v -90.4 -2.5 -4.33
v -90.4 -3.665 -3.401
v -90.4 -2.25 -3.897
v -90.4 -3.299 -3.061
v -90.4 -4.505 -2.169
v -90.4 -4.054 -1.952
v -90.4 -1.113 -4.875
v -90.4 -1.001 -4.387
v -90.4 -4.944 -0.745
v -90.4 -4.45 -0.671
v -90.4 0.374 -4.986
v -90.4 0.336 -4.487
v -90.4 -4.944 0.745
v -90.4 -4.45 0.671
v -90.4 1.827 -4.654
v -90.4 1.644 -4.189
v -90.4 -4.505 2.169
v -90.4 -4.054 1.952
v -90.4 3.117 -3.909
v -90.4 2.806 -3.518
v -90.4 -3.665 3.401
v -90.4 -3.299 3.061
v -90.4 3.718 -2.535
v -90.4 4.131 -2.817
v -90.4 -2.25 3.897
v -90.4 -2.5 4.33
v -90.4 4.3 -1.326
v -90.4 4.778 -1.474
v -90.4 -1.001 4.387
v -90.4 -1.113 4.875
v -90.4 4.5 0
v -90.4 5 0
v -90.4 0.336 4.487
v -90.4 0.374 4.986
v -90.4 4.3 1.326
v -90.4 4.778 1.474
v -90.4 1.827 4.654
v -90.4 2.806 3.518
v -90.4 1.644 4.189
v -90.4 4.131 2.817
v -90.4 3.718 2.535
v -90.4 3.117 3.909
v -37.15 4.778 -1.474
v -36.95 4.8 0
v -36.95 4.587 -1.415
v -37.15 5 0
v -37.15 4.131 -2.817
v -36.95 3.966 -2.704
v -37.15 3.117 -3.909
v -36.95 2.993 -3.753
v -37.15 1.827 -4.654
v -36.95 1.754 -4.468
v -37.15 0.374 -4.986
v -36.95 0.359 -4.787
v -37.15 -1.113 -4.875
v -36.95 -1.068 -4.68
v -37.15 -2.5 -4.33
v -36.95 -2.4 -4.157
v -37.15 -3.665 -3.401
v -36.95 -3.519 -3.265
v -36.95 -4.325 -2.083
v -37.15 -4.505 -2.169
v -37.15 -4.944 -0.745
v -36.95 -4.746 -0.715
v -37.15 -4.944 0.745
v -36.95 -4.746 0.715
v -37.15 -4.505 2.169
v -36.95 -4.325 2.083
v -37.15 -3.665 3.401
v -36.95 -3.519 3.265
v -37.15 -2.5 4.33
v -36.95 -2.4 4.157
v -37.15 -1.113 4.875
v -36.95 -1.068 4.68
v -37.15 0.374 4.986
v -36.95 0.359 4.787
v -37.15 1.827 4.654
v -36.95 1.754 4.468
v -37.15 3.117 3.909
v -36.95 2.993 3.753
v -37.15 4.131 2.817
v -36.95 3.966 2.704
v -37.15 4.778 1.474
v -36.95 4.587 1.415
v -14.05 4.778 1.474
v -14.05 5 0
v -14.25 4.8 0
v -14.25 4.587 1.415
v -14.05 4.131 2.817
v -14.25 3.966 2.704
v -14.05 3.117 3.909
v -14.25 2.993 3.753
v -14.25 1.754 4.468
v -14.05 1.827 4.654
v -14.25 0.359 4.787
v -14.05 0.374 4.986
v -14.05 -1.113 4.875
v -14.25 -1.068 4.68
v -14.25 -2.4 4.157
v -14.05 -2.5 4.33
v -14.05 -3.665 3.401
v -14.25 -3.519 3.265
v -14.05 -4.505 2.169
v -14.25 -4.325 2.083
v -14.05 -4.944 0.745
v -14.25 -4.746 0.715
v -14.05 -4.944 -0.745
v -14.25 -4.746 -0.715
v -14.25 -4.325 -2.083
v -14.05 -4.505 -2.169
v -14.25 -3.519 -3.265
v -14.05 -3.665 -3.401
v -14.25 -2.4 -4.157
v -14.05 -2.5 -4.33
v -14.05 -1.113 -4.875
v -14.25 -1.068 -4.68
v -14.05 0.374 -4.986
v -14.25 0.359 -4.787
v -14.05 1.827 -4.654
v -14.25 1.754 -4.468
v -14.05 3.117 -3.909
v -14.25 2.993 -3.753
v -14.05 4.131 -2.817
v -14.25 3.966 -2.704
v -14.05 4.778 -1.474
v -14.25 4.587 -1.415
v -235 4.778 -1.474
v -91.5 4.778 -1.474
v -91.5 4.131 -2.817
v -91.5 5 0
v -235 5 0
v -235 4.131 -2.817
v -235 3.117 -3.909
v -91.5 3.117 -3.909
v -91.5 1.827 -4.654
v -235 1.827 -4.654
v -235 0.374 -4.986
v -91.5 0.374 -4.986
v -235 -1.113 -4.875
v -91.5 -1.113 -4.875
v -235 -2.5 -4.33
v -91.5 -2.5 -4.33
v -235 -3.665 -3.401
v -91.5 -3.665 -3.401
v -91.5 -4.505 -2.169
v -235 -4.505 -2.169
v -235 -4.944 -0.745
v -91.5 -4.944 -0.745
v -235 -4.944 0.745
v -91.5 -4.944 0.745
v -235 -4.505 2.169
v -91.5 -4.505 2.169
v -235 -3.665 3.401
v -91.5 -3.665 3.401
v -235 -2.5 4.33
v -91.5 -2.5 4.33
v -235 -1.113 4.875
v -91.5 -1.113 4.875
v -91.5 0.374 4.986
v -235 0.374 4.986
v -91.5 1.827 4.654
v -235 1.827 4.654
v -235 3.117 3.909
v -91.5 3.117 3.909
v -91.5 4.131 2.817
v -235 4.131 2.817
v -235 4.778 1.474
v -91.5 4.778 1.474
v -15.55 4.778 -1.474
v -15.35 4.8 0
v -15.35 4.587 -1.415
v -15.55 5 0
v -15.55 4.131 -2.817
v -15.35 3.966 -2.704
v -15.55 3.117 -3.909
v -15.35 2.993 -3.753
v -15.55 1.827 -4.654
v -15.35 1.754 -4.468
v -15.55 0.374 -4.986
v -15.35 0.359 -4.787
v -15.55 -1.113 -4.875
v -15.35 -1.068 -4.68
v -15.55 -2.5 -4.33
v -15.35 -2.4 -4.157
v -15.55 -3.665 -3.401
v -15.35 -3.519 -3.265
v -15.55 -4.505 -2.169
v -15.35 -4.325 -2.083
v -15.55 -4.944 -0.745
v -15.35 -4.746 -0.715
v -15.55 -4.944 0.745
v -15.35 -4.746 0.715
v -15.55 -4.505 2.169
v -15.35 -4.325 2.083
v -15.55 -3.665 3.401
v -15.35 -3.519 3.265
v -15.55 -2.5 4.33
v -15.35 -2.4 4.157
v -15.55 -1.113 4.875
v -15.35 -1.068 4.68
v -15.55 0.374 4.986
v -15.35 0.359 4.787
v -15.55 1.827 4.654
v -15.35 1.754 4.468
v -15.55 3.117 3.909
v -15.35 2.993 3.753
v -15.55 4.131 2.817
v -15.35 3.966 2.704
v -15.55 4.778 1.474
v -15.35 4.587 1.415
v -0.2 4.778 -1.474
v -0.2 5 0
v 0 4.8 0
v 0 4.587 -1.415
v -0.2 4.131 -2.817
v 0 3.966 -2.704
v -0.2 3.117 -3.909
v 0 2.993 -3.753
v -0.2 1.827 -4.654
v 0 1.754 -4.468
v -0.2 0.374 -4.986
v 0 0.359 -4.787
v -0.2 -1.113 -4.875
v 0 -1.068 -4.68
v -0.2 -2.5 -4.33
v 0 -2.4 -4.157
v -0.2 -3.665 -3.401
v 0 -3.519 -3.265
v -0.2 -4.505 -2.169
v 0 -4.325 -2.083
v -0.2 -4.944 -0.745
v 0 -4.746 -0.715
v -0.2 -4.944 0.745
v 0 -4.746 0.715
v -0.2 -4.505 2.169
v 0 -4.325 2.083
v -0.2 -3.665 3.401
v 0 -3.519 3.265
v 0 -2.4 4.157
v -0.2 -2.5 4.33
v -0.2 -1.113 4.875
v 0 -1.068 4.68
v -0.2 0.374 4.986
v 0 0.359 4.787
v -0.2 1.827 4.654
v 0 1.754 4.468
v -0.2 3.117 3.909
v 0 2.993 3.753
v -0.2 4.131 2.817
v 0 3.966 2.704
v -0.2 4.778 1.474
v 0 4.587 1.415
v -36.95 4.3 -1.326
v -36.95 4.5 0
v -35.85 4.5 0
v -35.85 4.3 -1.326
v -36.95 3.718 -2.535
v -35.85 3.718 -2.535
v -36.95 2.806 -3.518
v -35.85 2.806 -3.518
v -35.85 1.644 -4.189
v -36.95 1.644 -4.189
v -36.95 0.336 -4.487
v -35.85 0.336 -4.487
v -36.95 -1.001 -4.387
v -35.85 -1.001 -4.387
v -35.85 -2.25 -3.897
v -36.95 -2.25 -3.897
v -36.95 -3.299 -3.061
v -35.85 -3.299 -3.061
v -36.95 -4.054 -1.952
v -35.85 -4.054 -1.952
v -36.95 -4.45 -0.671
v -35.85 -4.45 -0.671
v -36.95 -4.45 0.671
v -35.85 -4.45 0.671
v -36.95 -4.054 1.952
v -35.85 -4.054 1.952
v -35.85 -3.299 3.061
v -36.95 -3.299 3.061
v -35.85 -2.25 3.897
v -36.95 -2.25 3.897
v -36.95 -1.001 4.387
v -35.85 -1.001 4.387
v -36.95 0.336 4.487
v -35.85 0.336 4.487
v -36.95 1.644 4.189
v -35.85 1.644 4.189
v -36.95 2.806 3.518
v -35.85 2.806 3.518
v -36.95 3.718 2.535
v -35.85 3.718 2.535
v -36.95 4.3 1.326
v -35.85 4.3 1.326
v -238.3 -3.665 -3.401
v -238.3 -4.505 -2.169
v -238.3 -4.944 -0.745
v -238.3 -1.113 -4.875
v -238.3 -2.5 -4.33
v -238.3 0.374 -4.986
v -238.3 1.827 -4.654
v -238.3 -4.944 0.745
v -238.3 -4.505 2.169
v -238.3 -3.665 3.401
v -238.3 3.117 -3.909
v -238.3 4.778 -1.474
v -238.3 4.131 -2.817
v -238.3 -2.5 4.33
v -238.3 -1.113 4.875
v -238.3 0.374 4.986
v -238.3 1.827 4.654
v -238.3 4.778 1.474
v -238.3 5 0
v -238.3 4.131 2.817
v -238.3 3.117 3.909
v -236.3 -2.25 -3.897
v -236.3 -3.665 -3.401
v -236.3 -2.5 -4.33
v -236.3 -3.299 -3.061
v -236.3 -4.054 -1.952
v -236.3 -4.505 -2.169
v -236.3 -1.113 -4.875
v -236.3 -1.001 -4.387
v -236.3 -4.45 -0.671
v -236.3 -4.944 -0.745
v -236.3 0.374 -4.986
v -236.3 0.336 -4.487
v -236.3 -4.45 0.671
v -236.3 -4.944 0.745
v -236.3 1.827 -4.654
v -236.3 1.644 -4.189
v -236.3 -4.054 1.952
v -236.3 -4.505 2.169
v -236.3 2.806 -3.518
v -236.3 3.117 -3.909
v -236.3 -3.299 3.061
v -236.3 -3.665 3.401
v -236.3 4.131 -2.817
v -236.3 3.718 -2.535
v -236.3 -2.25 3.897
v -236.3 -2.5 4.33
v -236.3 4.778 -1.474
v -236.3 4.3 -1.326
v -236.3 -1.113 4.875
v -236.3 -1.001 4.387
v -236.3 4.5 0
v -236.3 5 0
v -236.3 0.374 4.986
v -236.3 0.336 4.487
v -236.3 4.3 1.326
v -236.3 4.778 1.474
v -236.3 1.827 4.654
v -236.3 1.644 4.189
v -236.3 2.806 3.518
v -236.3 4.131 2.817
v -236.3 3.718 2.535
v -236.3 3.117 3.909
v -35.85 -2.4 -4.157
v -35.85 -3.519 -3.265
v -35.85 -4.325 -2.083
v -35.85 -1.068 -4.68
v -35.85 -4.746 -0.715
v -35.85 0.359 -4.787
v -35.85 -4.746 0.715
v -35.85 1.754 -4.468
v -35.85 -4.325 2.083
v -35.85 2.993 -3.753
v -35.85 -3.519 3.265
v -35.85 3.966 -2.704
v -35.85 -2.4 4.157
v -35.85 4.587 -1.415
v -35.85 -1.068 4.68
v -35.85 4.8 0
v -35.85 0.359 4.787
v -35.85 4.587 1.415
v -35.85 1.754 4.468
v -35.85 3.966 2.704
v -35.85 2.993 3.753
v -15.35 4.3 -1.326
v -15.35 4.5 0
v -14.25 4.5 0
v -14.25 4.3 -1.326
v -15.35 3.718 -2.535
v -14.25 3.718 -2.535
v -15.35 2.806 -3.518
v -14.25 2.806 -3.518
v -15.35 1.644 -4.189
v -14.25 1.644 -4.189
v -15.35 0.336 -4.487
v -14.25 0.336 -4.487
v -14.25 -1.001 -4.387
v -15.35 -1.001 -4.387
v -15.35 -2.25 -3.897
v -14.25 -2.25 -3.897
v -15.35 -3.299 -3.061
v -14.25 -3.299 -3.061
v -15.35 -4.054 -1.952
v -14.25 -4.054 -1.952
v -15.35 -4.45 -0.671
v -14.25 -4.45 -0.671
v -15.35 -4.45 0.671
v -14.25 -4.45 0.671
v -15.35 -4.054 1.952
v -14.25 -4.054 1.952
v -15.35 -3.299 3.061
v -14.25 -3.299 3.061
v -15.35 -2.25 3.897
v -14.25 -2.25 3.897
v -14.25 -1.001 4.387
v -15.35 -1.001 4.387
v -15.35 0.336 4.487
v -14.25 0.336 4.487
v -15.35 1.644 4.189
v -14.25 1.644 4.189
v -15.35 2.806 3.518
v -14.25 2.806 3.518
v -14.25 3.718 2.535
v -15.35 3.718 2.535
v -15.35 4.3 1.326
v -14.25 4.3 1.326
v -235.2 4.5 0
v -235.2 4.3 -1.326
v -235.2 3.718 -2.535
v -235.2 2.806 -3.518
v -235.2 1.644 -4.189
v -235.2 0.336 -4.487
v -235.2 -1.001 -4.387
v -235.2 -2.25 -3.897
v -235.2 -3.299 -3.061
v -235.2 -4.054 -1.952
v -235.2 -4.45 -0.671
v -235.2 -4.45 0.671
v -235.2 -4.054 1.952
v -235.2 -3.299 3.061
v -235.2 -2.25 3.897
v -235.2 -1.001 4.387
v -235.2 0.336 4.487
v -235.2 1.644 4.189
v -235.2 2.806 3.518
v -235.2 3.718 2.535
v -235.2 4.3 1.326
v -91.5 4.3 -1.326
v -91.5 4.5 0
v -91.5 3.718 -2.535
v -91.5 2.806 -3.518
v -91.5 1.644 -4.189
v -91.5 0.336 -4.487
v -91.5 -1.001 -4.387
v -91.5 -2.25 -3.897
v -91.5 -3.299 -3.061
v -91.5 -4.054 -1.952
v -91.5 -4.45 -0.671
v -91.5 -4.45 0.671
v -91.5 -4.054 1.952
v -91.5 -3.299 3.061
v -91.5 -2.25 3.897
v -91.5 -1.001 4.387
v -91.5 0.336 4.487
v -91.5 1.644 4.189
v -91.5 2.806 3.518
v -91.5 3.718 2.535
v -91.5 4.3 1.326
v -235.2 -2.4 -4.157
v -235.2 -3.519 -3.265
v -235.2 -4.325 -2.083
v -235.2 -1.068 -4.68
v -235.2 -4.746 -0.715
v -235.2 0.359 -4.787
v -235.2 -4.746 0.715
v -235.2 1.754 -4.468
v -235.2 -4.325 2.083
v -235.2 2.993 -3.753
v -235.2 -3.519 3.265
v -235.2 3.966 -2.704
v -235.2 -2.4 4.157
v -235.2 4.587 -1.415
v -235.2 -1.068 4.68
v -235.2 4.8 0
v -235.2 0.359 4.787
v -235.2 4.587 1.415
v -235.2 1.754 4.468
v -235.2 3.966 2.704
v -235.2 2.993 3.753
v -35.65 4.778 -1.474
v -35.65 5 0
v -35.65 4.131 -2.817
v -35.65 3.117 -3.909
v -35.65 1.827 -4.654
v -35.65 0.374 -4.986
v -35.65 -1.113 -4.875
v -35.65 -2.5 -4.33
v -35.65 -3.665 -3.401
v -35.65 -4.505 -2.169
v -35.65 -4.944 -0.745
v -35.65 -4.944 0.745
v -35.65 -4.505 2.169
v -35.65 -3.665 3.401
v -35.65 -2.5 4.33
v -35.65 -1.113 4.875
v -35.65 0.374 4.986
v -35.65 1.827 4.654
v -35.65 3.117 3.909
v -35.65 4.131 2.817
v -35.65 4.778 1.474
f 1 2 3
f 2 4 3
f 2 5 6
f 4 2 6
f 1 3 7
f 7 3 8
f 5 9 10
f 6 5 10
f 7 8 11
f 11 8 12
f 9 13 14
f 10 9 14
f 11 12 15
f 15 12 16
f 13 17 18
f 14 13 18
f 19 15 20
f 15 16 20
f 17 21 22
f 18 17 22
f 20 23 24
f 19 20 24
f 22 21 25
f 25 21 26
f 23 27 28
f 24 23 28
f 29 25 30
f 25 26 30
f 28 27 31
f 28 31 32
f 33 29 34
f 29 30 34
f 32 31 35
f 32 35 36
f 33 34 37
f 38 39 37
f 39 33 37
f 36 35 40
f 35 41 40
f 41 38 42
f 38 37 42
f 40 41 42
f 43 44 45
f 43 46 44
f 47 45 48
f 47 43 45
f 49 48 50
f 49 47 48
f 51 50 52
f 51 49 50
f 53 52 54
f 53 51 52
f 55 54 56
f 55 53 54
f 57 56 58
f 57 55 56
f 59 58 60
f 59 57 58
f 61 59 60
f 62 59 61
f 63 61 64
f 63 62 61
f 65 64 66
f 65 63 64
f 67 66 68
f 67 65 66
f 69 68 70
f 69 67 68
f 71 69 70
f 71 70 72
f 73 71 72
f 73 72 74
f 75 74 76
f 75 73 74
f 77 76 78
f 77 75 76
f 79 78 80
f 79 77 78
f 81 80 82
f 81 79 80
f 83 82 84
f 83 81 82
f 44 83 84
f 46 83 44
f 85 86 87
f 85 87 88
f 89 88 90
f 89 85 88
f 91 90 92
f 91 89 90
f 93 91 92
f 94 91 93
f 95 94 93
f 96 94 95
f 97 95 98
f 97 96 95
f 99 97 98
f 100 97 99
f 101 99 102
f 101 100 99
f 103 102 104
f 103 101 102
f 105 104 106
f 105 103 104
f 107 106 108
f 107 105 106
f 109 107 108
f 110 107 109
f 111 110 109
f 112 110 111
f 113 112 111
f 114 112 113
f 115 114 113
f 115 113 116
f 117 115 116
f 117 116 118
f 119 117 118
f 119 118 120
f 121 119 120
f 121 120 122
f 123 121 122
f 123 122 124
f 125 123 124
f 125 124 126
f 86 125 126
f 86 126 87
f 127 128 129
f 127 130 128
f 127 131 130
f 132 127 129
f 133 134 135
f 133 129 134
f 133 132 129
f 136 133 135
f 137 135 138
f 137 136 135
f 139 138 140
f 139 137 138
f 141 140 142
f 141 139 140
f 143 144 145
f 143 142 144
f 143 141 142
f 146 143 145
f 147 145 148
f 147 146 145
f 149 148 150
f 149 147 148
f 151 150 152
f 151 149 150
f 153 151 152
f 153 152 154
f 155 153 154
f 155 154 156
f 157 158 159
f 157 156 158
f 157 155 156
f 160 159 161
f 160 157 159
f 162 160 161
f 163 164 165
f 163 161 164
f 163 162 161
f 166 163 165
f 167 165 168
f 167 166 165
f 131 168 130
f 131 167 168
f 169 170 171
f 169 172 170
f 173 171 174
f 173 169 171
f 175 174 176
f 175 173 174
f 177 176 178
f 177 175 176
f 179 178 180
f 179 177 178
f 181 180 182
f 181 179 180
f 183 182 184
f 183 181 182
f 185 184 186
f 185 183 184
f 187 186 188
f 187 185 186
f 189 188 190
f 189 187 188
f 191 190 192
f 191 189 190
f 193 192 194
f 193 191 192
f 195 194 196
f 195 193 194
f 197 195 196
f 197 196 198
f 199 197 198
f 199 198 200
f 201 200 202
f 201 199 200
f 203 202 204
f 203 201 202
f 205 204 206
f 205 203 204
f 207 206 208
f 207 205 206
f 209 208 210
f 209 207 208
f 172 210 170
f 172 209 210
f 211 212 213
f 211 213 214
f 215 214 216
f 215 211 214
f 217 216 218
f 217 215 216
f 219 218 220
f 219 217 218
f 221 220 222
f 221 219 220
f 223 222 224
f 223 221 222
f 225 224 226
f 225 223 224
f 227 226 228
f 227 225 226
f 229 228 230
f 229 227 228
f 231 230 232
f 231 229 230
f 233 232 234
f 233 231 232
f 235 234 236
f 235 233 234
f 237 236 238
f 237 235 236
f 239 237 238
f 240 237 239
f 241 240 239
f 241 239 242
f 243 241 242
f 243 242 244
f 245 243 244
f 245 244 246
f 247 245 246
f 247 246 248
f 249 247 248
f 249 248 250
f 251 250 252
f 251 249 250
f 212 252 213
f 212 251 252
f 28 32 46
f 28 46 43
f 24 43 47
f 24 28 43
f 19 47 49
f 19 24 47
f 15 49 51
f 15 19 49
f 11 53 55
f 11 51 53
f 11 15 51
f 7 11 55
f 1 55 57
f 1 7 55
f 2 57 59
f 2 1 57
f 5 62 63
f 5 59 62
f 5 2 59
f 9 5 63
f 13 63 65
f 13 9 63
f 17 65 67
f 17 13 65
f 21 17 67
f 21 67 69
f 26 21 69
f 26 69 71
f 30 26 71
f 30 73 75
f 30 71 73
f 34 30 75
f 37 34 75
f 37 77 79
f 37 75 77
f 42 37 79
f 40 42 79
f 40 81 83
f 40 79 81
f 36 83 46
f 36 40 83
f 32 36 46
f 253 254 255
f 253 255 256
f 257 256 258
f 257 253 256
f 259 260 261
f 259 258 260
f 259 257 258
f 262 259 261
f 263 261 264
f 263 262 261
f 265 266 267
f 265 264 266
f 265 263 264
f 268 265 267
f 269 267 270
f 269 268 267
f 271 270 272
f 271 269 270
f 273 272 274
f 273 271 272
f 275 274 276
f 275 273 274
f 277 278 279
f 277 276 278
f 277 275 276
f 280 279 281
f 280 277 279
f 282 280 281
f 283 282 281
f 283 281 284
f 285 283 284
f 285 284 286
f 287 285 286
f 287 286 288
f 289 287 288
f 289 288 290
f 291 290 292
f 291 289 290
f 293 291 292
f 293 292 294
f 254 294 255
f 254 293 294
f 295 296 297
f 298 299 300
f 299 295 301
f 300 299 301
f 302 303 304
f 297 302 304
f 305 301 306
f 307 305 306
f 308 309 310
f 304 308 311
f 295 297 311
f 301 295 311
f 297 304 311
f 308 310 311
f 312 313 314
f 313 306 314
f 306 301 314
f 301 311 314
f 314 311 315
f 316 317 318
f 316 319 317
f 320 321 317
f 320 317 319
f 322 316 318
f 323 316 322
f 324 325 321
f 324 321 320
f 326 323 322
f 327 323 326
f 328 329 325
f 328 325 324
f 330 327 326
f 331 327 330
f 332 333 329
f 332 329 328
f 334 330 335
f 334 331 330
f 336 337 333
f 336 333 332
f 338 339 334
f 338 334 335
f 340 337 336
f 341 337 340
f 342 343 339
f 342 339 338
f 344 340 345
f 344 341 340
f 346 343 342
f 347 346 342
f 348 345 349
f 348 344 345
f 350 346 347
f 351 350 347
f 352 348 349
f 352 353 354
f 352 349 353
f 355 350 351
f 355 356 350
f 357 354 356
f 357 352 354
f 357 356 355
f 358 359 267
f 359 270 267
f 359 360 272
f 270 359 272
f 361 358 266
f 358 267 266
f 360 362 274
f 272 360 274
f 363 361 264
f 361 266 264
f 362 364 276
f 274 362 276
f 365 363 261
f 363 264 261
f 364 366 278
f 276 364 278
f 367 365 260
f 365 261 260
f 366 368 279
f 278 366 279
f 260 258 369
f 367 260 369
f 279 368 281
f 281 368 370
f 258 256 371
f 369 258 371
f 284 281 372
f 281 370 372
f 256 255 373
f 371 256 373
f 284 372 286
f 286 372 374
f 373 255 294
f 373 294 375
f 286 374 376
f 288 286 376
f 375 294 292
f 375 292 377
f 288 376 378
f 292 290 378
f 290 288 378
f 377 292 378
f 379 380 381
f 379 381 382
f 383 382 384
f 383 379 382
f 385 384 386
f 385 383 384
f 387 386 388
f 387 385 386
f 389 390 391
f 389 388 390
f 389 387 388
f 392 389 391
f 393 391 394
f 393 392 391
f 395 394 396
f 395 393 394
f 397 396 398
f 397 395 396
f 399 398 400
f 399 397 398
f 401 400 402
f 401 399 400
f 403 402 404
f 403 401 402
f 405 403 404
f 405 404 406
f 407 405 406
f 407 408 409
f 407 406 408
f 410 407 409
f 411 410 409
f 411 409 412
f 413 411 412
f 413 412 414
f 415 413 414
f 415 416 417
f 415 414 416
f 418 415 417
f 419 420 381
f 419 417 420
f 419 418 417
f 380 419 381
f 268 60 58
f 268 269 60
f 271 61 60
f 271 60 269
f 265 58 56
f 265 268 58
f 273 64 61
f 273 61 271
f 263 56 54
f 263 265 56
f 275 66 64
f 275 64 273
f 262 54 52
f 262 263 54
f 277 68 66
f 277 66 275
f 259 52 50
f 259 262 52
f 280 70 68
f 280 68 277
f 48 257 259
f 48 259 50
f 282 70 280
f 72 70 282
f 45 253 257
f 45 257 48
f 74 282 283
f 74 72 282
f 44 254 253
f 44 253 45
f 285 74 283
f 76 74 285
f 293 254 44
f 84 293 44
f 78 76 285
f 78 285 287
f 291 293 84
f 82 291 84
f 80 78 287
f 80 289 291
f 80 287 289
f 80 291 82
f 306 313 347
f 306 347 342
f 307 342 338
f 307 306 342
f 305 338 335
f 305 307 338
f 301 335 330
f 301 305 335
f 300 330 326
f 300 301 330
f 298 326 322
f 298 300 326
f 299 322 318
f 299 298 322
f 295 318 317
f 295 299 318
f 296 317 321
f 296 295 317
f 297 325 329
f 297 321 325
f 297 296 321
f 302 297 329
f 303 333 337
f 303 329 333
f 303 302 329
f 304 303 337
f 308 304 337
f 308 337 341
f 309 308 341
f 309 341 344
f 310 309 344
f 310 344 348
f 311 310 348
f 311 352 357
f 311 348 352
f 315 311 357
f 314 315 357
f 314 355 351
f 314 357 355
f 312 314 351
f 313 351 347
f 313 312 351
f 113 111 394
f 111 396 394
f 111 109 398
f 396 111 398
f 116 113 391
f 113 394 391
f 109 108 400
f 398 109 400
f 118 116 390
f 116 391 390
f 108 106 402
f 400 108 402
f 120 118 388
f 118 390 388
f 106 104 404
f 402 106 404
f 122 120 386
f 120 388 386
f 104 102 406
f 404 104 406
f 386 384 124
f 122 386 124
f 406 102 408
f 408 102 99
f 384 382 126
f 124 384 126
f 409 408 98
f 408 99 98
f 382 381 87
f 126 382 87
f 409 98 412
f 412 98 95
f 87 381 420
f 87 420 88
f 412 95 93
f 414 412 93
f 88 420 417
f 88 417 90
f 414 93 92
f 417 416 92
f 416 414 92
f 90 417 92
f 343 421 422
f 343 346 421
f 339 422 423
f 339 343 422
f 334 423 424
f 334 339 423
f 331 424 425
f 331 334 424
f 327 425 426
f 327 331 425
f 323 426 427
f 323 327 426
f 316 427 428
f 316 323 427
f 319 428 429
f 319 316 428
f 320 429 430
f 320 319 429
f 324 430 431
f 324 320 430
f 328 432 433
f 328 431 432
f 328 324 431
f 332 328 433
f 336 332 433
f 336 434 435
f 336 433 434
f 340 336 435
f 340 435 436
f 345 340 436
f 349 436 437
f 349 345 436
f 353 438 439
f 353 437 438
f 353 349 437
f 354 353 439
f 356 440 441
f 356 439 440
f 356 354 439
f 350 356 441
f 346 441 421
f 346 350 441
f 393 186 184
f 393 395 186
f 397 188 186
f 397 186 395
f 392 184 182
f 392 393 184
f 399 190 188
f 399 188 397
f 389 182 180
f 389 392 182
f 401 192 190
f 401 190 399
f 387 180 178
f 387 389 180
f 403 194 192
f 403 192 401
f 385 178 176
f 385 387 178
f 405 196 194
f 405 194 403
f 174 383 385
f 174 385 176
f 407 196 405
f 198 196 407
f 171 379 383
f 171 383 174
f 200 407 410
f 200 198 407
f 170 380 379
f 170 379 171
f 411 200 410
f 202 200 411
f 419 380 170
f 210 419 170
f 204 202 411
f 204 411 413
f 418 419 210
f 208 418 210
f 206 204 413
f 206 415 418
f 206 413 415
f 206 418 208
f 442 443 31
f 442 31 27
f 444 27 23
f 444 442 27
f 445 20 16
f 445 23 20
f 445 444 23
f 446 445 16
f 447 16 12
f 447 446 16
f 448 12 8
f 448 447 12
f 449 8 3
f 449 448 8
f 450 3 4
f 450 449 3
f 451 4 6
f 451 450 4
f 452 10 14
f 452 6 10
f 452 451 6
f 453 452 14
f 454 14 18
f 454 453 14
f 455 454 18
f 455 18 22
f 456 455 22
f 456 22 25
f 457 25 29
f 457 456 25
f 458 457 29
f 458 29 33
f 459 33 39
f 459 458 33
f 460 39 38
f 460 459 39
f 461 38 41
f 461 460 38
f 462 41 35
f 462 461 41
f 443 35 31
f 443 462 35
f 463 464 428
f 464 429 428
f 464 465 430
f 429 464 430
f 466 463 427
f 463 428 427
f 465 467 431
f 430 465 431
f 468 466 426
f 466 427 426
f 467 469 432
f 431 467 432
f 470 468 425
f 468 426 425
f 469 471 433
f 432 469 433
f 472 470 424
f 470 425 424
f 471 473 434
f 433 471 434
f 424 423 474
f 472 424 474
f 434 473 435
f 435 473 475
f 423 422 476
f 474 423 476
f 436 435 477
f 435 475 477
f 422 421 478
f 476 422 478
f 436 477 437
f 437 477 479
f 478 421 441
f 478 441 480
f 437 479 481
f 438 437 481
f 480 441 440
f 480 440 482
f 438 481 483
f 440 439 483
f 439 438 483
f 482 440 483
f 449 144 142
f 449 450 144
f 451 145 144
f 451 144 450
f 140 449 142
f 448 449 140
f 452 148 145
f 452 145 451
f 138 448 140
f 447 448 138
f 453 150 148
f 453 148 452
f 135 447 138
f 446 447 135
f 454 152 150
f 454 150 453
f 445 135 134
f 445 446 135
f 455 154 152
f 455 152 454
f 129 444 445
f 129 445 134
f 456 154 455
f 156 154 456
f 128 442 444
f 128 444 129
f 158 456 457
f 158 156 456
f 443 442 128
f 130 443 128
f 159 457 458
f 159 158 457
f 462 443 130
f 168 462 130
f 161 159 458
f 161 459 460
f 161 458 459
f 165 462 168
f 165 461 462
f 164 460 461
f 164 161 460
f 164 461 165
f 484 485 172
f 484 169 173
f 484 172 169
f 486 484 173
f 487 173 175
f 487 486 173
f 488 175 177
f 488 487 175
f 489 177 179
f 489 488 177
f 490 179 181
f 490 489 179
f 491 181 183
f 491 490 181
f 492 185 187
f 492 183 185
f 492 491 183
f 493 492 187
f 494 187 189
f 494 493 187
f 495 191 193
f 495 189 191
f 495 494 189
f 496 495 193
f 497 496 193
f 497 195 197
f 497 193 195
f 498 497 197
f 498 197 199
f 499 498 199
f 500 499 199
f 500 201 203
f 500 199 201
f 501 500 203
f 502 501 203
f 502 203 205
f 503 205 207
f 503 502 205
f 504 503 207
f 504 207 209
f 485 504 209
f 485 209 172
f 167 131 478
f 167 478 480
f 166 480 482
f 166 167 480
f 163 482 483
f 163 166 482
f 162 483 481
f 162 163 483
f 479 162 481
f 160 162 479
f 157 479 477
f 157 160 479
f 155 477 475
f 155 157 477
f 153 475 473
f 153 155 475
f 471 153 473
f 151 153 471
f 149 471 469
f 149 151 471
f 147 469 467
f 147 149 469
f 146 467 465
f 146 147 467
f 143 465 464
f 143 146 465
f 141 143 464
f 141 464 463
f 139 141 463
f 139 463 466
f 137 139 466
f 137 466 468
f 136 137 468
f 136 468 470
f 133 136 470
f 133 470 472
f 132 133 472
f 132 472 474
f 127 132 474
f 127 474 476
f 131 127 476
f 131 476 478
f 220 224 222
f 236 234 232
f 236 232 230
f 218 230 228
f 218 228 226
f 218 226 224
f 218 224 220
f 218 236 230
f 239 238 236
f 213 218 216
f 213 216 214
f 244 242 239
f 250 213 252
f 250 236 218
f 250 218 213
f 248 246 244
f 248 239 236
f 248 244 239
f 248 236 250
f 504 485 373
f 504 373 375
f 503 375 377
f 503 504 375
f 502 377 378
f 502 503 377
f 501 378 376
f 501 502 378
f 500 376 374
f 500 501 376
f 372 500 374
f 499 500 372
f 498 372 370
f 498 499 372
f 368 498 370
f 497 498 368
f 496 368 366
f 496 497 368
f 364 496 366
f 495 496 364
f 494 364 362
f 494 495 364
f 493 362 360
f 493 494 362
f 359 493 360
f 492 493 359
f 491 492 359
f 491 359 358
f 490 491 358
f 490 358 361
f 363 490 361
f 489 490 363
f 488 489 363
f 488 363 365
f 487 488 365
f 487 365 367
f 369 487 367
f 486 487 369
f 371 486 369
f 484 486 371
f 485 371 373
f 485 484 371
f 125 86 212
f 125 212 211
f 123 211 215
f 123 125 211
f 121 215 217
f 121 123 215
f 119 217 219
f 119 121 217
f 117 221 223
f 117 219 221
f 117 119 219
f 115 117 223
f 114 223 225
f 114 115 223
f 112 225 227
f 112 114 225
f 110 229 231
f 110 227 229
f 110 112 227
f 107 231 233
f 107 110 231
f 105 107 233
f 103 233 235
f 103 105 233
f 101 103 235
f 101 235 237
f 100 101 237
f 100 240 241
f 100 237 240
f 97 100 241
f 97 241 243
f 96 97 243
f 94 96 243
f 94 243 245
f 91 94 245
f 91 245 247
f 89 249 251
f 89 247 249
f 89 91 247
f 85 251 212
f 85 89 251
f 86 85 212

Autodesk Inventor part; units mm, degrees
ref_plane "YZ Plane" through (0, 0, 0) normal (1, 0, 0) x (0, 1, 0)
ref_plane "XZ Plane" through (0, 0, 0) normal (0, 1, 0) x (-1, 0, 0)
ref_plane "XY Plane" through (0, 0, 0) normal (0, 0, 1) x (1, 0, 0)
sketch "Sketch1" plane through (0, 0, 0) normal (0, 0, 1) x (1, 0, 0)
  line L0 (0, 0) -> (0, 5)
  line L1 (0, 5) -> (-14.25, 5)
  line L2 (-14.25, 5) -> (-14.25, 4.5)
  line L3 (-14.25, 4.5) -> (-15.35, 4.5)
  line L4 (-15.35, 4.5) -> (-15.35, 5)
  line L5 (-15.35, 5) -> (-35.85, 5)
  line L6 (-35.85, 5) -> (-35.85, 4.5)
  line L7 (-35.85, 4.5) -> (-36.95, 4.5)
  line L8 (-36.95, 4.5) -> (-36.95, 5)
  line L9 (-235.2, 0) -> (0, 0)
  line L10 (-36.95, 5) -> (-90.4, 5)
  line L11 (-90.4, 5) -> (-90.4, 4.5)
  line L12 (-90.4, 4.5) -> (-91.5, 4.5)
  line L13 (-91.5, 4.5) -> (-91.5, 5)
  line L14 (-91.5, 5) -> (-235.2, 5)
  line L15 (-235.2, 5) -> (-235.2, 4.5)
  line L16 (-235.2, 4.5) -> (-236.3, 4.5)
  line L17 (-236.3, 4.5) -> (-236.3, 5)
  line L18 (-236.3, 5) -> (-238.3, 5)
  line L19 (-238.3, 5) -> (-238.3, 0)
  line L20 (-238.3, 0) -> (-235.2, 0)
  dimension "d0" = 5
  dimension "d1" = 0.5
  dimension "d2" = 1.1
  dimension "d3" = 1.1
  dimension "d4" = 15.35
  dimension "d6" = 35.85
  dimension "d11" = 1.1
  dimension "d12" = 91.5
  dimension "d13" = 1.1
  dimension "d14" = 2
  dimension "d15" = 238.3
revolve "Revolution1" add sketch "Sketch1" angle 360 about axis through (-235.2, 0, 0) along (1, 0, 0)
chamfer "Chamfer1" distance 0.2 angle 45 6 edges at (-235.2, -5, 0) (-35.85, -5, 0) (-36.95, -5, 0) (-14.25, -5, 0) (-15.35, -5, 0) (0, -5, 0)
properties part number "Joint0_LongShaft"
